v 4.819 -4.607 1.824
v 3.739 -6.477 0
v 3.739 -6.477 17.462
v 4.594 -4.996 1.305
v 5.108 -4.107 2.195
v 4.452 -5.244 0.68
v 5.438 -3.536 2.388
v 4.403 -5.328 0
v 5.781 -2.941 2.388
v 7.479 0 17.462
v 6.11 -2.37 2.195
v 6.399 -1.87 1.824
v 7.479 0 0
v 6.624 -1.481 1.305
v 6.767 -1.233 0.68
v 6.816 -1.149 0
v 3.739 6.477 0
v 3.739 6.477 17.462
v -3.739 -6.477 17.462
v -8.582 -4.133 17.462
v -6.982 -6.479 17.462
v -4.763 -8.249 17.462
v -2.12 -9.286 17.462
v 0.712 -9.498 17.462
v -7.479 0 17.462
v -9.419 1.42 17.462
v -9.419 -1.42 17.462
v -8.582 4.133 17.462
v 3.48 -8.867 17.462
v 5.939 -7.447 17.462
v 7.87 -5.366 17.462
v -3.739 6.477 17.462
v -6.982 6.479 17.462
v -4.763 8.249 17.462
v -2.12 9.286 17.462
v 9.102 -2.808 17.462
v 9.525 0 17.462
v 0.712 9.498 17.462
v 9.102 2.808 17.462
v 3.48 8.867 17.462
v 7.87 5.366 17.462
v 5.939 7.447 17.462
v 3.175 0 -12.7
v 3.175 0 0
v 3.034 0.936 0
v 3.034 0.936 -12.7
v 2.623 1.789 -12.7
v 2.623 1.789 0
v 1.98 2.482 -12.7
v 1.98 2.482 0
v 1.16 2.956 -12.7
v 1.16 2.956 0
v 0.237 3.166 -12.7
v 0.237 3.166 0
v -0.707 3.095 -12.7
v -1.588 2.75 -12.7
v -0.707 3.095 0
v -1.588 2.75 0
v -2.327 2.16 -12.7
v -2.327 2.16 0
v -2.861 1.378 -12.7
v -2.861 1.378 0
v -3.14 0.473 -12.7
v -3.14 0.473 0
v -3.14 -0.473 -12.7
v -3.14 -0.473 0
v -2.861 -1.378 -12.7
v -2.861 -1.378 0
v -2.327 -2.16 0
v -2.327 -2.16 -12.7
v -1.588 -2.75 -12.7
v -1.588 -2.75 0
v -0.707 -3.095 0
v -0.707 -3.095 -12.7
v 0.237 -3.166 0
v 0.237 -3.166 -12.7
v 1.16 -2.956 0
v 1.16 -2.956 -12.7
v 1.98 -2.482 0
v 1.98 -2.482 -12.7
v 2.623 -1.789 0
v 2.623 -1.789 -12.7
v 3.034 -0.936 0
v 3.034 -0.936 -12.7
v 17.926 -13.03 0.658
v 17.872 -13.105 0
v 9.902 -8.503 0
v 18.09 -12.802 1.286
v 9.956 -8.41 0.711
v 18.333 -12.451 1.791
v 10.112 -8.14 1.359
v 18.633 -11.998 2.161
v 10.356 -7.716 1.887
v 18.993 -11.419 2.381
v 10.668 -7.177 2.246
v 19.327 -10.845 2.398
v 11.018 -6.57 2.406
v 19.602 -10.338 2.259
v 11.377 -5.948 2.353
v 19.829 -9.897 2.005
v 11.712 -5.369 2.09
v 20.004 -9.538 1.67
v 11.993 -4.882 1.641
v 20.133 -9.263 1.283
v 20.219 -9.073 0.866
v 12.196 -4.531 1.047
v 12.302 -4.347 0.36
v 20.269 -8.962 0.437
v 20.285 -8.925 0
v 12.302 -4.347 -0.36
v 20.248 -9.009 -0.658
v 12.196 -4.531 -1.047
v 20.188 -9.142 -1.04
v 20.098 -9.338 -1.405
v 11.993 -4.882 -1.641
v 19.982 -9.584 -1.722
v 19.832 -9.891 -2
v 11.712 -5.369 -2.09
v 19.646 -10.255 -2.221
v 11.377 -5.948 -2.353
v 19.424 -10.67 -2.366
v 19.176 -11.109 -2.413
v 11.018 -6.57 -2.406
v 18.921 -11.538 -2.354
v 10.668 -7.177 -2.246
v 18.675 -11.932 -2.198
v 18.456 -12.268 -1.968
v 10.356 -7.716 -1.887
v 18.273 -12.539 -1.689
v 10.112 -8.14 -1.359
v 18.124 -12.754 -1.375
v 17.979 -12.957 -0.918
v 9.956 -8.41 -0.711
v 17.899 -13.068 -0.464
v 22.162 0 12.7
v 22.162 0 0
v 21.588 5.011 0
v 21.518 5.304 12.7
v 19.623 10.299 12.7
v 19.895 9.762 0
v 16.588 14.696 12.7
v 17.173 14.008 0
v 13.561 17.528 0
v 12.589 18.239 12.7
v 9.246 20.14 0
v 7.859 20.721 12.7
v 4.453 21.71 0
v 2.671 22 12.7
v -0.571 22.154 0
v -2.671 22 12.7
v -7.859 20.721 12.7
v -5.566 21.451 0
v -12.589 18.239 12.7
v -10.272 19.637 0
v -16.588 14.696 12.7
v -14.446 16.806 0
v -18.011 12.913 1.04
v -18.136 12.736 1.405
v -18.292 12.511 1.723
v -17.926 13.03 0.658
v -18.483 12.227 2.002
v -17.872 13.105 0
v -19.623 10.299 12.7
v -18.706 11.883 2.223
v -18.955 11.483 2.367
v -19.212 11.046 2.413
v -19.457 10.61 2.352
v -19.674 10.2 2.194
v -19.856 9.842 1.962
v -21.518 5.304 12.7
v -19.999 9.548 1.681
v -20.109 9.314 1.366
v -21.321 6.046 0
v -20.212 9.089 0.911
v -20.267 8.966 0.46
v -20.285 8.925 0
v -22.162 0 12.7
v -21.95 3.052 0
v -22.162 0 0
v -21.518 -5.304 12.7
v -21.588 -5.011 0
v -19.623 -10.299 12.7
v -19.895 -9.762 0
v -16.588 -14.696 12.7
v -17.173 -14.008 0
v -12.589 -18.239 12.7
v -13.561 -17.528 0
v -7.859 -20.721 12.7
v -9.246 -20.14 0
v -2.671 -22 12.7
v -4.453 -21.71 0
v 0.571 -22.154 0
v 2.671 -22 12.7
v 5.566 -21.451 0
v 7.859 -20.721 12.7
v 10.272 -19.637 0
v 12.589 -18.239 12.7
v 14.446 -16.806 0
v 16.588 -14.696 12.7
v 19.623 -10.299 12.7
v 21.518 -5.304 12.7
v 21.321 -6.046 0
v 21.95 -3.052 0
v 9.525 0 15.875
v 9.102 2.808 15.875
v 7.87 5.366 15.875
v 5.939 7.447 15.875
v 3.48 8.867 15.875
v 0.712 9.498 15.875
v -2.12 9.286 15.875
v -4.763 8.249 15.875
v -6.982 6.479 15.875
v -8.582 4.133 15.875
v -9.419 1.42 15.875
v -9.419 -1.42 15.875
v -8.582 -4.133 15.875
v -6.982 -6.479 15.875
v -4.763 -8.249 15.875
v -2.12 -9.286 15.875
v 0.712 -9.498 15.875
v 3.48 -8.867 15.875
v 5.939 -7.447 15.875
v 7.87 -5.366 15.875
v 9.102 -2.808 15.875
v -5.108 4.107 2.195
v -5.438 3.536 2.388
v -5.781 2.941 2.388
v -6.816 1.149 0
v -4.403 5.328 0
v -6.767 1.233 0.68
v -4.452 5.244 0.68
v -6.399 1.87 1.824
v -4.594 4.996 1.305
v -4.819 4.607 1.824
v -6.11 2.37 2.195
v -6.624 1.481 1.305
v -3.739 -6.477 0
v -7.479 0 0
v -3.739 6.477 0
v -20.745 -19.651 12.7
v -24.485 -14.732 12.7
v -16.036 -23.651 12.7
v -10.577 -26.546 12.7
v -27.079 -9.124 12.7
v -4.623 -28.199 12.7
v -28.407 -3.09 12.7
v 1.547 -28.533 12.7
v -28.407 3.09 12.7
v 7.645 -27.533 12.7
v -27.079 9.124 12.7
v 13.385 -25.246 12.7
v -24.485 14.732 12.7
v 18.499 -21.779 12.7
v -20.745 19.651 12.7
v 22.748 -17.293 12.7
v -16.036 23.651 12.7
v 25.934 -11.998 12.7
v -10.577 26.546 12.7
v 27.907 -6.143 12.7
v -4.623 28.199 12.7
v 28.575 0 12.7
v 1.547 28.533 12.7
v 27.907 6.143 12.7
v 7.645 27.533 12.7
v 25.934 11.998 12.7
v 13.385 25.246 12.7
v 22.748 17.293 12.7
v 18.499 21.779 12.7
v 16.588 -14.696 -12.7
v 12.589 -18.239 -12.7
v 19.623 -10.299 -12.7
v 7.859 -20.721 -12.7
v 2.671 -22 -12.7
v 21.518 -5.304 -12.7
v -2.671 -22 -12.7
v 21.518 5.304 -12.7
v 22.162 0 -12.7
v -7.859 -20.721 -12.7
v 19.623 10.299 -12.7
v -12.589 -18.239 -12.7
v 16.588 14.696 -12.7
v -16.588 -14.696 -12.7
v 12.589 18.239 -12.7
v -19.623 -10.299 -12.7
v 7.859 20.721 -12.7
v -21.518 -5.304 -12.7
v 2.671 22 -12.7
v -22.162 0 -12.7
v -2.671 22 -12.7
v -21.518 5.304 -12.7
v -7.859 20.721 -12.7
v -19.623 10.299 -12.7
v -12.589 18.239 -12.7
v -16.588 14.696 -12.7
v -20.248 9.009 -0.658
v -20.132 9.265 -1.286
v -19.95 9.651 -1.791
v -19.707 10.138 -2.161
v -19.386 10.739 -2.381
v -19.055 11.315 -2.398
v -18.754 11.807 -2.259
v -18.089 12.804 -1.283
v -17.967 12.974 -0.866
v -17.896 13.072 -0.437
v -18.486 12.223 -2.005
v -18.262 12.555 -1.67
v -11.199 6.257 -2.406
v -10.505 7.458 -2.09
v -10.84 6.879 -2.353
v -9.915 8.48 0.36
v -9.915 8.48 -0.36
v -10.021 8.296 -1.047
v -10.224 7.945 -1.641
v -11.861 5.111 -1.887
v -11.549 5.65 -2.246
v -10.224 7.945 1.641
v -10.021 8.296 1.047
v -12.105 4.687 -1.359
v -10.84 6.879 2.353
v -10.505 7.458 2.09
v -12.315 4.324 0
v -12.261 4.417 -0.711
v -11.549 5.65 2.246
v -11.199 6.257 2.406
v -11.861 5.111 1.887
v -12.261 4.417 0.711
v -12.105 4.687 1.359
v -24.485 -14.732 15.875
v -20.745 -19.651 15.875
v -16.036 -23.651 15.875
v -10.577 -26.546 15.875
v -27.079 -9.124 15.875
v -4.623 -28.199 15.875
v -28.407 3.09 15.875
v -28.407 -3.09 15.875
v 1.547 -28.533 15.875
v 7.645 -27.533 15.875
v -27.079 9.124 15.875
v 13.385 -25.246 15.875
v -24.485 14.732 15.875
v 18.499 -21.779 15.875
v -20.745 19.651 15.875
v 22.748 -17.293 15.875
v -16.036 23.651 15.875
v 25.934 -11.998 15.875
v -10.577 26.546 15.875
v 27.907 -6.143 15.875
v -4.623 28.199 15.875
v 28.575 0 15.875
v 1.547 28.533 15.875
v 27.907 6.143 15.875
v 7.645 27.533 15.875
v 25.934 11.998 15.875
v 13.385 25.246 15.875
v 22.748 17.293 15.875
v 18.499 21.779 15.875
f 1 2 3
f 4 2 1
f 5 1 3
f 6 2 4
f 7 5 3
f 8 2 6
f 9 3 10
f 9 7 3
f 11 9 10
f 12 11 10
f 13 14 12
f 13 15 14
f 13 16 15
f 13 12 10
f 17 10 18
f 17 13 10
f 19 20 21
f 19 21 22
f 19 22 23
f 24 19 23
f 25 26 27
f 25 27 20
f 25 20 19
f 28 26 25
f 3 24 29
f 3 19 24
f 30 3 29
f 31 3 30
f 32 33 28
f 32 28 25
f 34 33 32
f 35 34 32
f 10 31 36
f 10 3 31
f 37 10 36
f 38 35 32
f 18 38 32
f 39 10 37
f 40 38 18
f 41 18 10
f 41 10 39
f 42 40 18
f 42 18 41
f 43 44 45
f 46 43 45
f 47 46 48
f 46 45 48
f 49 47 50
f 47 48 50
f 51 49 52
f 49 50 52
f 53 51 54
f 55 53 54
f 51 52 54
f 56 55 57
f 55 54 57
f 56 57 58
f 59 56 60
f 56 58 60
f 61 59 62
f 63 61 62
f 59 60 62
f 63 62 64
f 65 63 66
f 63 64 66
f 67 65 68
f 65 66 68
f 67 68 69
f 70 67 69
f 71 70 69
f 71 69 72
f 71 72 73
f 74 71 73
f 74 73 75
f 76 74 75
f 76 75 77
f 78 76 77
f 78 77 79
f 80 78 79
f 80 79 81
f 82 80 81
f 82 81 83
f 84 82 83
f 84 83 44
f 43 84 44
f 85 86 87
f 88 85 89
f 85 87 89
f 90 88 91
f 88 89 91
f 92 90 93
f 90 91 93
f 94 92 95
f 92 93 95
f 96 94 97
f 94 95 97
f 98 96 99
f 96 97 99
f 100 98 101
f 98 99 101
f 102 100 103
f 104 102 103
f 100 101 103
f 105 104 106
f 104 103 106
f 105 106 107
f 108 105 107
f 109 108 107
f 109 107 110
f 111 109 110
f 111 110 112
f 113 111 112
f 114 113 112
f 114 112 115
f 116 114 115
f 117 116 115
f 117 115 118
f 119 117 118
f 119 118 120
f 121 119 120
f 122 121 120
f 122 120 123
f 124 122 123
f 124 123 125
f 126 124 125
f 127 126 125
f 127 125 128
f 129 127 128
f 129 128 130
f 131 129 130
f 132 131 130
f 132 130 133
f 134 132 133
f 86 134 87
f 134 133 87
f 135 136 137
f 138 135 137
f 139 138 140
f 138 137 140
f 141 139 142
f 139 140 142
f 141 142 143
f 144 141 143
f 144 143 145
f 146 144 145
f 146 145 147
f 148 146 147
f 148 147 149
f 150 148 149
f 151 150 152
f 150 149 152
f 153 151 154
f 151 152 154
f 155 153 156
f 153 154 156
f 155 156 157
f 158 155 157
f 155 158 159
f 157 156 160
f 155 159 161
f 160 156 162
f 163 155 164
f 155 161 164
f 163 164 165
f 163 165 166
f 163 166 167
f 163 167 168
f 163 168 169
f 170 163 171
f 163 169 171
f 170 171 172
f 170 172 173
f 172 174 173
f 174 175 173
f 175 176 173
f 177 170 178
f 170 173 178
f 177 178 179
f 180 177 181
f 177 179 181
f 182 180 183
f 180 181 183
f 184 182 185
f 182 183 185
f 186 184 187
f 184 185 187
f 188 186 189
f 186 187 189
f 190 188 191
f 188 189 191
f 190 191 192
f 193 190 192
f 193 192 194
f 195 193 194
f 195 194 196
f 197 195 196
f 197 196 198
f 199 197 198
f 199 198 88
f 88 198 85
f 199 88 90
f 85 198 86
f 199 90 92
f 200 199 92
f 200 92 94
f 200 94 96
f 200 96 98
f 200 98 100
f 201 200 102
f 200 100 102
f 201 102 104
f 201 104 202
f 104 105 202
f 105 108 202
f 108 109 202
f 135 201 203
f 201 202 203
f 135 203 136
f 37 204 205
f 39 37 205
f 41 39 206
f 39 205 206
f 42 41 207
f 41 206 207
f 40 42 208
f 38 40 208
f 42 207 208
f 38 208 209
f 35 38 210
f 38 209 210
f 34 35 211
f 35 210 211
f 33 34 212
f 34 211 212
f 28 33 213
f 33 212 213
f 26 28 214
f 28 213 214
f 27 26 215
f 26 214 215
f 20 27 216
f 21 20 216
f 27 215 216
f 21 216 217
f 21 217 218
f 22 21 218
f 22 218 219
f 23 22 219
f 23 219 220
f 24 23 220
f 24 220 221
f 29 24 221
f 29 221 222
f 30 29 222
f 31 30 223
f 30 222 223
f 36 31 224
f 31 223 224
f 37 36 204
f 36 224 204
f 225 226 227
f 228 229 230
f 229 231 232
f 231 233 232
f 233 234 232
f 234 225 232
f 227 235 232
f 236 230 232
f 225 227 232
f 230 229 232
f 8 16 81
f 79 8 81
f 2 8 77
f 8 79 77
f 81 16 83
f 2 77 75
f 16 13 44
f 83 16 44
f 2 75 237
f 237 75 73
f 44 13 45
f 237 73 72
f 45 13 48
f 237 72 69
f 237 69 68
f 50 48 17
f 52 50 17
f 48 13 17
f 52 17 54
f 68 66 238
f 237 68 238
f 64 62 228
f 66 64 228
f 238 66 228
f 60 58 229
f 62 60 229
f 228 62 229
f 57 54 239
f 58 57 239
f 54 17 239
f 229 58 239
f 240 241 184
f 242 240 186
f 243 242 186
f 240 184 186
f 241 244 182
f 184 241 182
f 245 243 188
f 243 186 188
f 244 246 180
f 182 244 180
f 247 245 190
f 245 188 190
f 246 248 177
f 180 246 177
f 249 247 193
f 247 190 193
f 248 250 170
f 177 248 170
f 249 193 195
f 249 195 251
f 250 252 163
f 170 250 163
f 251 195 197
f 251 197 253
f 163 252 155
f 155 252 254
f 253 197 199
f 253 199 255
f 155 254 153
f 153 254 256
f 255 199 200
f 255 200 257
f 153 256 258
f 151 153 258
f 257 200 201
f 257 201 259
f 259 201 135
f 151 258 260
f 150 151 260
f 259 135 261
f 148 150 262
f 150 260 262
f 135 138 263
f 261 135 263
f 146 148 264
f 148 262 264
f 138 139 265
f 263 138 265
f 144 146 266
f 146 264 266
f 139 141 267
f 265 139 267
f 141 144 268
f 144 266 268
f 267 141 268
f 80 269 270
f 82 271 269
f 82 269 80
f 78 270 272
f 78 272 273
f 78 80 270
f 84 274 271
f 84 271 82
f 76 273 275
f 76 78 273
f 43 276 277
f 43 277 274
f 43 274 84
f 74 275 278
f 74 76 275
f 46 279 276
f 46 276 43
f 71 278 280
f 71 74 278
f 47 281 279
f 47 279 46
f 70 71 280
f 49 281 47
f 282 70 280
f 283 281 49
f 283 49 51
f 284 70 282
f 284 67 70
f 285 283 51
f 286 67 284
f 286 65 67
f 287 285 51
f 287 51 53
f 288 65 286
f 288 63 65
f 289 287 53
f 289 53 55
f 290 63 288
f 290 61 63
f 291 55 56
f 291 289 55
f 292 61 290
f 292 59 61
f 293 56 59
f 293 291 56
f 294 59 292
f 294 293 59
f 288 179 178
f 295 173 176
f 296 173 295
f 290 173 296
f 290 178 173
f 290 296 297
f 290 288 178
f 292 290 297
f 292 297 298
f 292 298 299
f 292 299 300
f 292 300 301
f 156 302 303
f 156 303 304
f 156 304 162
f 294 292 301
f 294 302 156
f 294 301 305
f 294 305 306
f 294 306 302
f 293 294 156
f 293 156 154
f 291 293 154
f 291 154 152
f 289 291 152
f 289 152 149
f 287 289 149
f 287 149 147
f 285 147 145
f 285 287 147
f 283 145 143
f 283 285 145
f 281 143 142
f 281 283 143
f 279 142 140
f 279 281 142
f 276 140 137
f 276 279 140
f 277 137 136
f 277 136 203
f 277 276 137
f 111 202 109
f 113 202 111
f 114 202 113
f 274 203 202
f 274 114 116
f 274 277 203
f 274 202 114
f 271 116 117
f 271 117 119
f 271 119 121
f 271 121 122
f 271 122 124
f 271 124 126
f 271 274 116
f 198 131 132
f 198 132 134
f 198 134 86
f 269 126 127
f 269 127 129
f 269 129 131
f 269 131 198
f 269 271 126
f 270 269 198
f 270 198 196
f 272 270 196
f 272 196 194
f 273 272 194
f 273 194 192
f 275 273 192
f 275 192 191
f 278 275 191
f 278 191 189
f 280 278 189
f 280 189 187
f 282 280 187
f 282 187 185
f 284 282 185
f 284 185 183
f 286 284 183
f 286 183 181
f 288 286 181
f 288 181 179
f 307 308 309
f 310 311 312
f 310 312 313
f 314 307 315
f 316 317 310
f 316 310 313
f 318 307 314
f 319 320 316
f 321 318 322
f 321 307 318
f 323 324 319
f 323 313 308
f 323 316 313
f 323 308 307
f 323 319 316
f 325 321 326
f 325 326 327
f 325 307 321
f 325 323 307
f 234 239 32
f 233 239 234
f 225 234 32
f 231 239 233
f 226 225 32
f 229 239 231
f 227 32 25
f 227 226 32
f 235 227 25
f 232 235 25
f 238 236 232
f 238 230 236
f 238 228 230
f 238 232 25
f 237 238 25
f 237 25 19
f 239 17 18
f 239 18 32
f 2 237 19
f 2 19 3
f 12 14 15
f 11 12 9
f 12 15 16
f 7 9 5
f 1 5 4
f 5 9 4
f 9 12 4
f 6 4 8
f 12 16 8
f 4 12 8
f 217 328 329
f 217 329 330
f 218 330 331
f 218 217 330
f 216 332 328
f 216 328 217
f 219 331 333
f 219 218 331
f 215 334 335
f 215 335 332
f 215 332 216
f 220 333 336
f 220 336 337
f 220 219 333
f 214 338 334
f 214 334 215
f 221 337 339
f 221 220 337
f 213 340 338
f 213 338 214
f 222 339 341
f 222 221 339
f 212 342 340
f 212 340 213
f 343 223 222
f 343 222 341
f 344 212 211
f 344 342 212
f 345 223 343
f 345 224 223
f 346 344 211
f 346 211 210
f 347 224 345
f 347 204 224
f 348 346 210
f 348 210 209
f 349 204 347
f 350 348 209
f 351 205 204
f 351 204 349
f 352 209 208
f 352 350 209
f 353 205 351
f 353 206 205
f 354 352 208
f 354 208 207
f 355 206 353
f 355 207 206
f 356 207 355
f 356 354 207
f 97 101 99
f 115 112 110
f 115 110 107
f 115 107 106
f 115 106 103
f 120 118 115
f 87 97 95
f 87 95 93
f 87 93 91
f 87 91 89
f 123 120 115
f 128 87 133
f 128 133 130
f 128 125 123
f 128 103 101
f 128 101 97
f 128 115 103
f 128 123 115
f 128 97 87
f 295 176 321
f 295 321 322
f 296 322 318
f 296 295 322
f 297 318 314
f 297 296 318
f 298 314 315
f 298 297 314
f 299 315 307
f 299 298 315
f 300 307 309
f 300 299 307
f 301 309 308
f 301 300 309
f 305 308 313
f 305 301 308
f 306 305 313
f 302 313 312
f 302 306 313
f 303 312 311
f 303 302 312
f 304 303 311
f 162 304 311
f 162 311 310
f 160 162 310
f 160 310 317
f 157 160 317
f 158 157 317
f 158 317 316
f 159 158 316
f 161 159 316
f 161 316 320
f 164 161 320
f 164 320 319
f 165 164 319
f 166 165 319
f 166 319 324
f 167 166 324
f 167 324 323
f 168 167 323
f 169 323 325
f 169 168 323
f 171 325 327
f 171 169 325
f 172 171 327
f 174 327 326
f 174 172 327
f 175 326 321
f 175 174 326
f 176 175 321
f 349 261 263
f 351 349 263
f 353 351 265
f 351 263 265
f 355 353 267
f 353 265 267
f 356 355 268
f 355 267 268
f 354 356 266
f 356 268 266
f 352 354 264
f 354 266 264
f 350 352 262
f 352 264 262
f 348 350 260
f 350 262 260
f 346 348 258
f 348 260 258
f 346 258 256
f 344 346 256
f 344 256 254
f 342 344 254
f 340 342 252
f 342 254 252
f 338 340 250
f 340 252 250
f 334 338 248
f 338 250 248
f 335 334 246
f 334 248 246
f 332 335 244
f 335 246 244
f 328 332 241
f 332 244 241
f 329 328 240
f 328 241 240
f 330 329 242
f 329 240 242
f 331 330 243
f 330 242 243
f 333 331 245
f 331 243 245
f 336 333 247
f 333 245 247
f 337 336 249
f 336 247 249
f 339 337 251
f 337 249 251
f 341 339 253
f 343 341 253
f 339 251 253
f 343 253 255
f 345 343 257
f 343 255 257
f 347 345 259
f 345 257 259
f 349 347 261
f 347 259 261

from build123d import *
from build123d.topology import SkipClean

# Parameters (mm, degrees)
SKETCH1_R           = 22.1615
BOSS_EXTRUDE1_DEPTH = 12.7
SKETCH2_R           = 28.575
BOSS_EXTRUDE2_DEPTH = 3.175
BOSS_EXTRUDE3_START = 12.7
SKETCH3_R           = 22.1615
BOSS_EXTRUDE3_DEPTH = 12.7
SKETCH5_R           = 9.525
BOSS_EXTRUDE4_DEPTH = 1.5875
SKETCH6_R           = 3.175
CUT_EXTRUDE1_DEPTH  = 17.78
SKETCH8_R           = 2.413
CUT_EXTRUDE2_DEPTH  = 21.336
CUT_EXTRUDE3_START  = -22.86
SKETCH9_R           = 2.413
CUT_EXTRUDE3_DEPTH  = 22.86
BOSS_EXTRUDE6_START = 6.35
SKETCH10_R          = 2.413
BOSS_EXTRUDE6_DEPTH = 6.35
SKETCH11_R          = 2.413
BOSS_EXTRUDE7_DEPTH = 6.35


with BuildPart() as part:
    # Sketch1 → Boss-Extrude1 (new body)
    with BuildSketch(Plane.XY):
        Circle(SKETCH1_R)
        Polygon((7.478995387, 0), (3.739497694, 6.477), (-3.739497694, 6.477), (-7.478995387, 0), (-3.739497694, -6.477), (3.739497694, -6.477), align=None, mode=Mode.SUBTRACT)
    extrude(amount=BOSS_EXTRUDE1_DEPTH)

    # Sketch2 → Boss-Extrude2 (add)
    with BuildSketch(Plane.XY.offset(12.7)):
        Circle(SKETCH2_R)
        Polygon((7.478995387, 0), (3.739497694, 6.477), (-3.739497694, 6.477), (-7.478995387, 0), (-3.739497694, -6.477), (3.739497694, -6.477), align=None, mode=Mode.SUBTRACT)
    extrude(amount=BOSS_EXTRUDE2_DEPTH)

    # Sketch3 → Boss-Extrude3 (add)
    with BuildSketch(Plane(origin=(0, 0, 0), x_dir=(-1, 0, 0), z_dir=(0, 0, -1)).offset(BOSS_EXTRUDE3_START)):
        Circle(SKETCH3_R)
    extrude(amount=-BOSS_EXTRUDE3_DEPTH)

    # Sketch5 → Boss-Extrude4 (add)
    with BuildSketch(Plane.XY.offset(15.875)):
        Circle(SKETCH5_R)
        Polygon((7.478995387, 0), (3.739497694, 6.477), (-3.739497694, 6.477), (-7.478995387, 0), (-3.739497694, -6.477), (3.739497694, -6.477), align=None, mode=Mode.SUBTRACT)
    extrude(amount=BOSS_EXTRUDE4_DEPTH)

    # Sketch6 → Cut-Extrude1 (cut)
    with BuildSketch(Plane.XY):
        Circle(SKETCH6_R)
    extrude(amount=-CUT_EXTRUDE1_DEPTH, mode=Mode.SUBTRACT)

    # Sketch8 → Cut-Extrude2 (cut)
    with BuildSketch(Plane(origin=(5.60924654, -3.2385, 0), x_dir=(0, 0, 1), z_dir=(-0.8660254037844389, 0.4999999999999997, 0))):
        with Locations(Location((0, 0, 0), (0, 0, 270))):
            Circle(SKETCH8_R)
    extrude(amount=-CUT_EXTRUDE2_DEPTH, mode=Mode.SUBTRACT)

    # Sketch9 → Cut-Extrude3 (cut)
    with SkipClean():  # the faces are left unmerged after this step: merging them gives an invalid solid
        with BuildSketch(Plane(origin=(-5.60924654, 3.2385, 0), x_dir=(0, 0, -1), z_dir=(0.8660254037844386, -0.5000000000000001, 0)).offset(CUT_EXTRUDE3_START)):
            with Locations(Location((0, 0, 0), (0, 0, 270))):
                Circle(SKETCH9_R)
        extrude(amount=CUT_EXTRUDE3_DEPTH, mode=Mode.SUBTRACT)

    # Sketch10 → Boss-Extrude6 (add)
    with SkipClean():  # the faces are left unmerged after this step: merging them gives an invalid solid
        with BuildSketch(Plane(origin=(-5.60924654, 3.2385, 0), x_dir=(0, 0, 1), z_dir=(-0.8660254037844386, 0.5000000000000001, 0)).offset(BOSS_EXTRUDE6_START)):
            with Locations(Location((0, 0, 0), (0, 0, 270))):
                Circle(SKETCH10_R)
        extrude(amount=-BOSS_EXTRUDE6_DEPTH)

    # Sketch11 → Boss-Extrude7 (add)
    with SkipClean():  # the faces are left unmerged after this step: merging them gives an invalid solid
        with BuildSketch(Plane(origin=(5.60924654, -3.2385, 0), x_dir=(0, 0, -1), z_dir=(0.8660254037844388, -0.49999999999999983, 0))):
            with Locations(Location((0, 0, 0), (0, 0, 270))):
                Circle(SKETCH11_R)
        extrude(amount=BOSS_EXTRUDE7_DEPTH)


solid = part.part
